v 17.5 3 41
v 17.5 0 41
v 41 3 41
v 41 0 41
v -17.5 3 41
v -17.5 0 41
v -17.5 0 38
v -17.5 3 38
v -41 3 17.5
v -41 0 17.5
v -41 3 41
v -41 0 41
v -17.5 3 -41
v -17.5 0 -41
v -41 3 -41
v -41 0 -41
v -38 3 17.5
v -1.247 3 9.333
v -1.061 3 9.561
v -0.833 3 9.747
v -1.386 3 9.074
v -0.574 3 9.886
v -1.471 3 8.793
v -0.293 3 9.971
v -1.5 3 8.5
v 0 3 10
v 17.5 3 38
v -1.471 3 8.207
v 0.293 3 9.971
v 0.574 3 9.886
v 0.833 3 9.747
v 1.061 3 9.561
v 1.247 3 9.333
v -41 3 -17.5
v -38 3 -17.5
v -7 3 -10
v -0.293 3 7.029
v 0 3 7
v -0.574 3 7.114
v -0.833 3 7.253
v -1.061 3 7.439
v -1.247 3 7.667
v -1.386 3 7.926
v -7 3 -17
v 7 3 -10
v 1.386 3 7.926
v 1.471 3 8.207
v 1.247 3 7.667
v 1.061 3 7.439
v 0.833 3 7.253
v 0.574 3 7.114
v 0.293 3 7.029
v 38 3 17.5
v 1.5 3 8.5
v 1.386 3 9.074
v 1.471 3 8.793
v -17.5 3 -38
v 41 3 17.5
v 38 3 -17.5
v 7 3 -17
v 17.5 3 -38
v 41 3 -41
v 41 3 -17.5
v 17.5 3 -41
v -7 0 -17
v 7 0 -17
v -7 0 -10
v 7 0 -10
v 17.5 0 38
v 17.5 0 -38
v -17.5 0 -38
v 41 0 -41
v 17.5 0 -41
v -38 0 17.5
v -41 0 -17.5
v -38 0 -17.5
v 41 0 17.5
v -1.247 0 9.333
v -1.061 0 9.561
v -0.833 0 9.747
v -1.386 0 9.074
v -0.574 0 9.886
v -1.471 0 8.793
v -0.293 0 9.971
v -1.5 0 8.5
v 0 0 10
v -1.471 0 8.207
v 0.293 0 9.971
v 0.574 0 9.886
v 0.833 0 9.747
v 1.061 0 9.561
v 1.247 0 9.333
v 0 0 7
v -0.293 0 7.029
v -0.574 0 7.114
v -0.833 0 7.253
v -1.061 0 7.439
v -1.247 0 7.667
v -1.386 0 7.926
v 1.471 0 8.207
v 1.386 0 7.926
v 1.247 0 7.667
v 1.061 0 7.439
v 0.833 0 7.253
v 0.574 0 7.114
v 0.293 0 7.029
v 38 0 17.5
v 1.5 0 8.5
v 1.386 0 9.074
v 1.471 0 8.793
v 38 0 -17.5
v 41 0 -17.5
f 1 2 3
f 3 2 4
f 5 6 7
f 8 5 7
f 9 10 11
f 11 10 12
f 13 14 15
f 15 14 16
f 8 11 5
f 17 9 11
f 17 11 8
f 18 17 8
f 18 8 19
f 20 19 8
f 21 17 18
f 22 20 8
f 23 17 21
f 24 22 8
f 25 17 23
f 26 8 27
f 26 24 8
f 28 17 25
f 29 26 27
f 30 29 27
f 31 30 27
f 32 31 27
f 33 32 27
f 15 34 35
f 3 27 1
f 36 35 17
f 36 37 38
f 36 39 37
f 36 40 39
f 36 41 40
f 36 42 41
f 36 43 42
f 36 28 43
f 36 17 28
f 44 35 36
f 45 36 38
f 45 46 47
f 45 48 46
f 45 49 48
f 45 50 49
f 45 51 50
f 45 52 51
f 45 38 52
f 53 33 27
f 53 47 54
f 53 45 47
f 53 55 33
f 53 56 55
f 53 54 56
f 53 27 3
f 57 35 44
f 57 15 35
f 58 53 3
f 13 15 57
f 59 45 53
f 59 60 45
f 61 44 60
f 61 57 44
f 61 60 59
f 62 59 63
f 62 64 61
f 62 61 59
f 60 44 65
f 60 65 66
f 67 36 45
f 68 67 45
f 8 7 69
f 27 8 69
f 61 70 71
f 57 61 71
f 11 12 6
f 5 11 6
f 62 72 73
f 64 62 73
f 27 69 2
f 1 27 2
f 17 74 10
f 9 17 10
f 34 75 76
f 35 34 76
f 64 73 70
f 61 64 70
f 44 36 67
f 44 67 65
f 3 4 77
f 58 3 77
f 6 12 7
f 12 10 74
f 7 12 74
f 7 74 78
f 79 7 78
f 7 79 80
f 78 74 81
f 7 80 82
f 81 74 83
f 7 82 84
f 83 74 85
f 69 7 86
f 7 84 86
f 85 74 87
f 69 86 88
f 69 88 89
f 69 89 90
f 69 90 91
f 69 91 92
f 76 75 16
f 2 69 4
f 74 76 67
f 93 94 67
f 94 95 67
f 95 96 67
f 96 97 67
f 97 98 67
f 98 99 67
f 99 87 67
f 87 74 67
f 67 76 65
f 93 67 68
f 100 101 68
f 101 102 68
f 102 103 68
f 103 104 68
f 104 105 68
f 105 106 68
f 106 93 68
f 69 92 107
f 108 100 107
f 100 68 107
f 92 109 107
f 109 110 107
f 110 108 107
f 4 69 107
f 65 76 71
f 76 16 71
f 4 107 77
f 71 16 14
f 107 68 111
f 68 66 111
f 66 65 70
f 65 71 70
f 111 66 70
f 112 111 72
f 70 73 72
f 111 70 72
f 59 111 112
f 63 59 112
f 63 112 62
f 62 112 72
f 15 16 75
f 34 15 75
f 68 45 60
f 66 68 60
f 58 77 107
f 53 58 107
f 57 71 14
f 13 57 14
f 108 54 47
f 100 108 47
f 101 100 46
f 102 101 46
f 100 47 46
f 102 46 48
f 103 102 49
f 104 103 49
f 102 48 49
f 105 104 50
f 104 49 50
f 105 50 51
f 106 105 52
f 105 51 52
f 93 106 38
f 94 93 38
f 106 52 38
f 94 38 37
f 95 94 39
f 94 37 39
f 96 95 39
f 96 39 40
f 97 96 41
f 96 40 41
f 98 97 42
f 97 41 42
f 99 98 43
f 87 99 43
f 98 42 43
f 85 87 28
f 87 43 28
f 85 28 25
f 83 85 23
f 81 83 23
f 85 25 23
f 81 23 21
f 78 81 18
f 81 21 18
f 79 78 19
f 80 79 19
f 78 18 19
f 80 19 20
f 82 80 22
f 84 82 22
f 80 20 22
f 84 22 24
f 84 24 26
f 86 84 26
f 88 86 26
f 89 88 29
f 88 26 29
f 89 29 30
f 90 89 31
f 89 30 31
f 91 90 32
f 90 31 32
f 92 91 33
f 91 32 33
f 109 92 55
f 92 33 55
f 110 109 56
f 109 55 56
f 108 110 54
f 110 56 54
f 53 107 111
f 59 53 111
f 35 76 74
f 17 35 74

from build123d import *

# Parameters (mm, degrees)
BOSS_EXTRUDE1_DEPTH = 3
SKETCH2_R           = 1.5
SKETCH2_W           = 14
SKETCH2_H           = 7
CUT_EXTRUDE1_DEPTH  = 3


with BuildPart() as part:
    # Sketch1 → Boss-Extrude1 (new body)
    with BuildSketch(Plane(origin=(0, 0, 0), x_dir=(1, 0, 0), z_dir=(0, 1, 0))):
        Polygon((-41, -41), (-17.5, -41), (-17.5, -38), (17.5, -38), (17.5, -41), (41, -41), (41, -17.5), (38, -17.5), (38, 17.5), (41, 17.5), (41, 41), (17.5, 41), (17.5, 38), (-17.5, 38), (-17.5, 41), (-41, 41), (-41, 17.5), (-38, 17.5), (-38, -17.5), (-41, -17.5), align=None)
    extrude(amount=BOSS_EXTRUDE1_DEPTH)

    # Sketch2 → Cut-Extrude1 (cut)
    with BuildSketch(Plane(origin=(0, 3, 0), x_dir=(1, 0, 0), z_dir=(0, 1, 0))):
        with Locations((0, -8.5)):
            Circle(SKETCH2_R)
        with Locations((0, 13.5)):
            Rectangle(SKETCH2_W, SKETCH2_H)
    extrude(amount=-CUT_EXTRUDE1_DEPTH, mode=Mode.SUBTRACT)


solid = part.part
